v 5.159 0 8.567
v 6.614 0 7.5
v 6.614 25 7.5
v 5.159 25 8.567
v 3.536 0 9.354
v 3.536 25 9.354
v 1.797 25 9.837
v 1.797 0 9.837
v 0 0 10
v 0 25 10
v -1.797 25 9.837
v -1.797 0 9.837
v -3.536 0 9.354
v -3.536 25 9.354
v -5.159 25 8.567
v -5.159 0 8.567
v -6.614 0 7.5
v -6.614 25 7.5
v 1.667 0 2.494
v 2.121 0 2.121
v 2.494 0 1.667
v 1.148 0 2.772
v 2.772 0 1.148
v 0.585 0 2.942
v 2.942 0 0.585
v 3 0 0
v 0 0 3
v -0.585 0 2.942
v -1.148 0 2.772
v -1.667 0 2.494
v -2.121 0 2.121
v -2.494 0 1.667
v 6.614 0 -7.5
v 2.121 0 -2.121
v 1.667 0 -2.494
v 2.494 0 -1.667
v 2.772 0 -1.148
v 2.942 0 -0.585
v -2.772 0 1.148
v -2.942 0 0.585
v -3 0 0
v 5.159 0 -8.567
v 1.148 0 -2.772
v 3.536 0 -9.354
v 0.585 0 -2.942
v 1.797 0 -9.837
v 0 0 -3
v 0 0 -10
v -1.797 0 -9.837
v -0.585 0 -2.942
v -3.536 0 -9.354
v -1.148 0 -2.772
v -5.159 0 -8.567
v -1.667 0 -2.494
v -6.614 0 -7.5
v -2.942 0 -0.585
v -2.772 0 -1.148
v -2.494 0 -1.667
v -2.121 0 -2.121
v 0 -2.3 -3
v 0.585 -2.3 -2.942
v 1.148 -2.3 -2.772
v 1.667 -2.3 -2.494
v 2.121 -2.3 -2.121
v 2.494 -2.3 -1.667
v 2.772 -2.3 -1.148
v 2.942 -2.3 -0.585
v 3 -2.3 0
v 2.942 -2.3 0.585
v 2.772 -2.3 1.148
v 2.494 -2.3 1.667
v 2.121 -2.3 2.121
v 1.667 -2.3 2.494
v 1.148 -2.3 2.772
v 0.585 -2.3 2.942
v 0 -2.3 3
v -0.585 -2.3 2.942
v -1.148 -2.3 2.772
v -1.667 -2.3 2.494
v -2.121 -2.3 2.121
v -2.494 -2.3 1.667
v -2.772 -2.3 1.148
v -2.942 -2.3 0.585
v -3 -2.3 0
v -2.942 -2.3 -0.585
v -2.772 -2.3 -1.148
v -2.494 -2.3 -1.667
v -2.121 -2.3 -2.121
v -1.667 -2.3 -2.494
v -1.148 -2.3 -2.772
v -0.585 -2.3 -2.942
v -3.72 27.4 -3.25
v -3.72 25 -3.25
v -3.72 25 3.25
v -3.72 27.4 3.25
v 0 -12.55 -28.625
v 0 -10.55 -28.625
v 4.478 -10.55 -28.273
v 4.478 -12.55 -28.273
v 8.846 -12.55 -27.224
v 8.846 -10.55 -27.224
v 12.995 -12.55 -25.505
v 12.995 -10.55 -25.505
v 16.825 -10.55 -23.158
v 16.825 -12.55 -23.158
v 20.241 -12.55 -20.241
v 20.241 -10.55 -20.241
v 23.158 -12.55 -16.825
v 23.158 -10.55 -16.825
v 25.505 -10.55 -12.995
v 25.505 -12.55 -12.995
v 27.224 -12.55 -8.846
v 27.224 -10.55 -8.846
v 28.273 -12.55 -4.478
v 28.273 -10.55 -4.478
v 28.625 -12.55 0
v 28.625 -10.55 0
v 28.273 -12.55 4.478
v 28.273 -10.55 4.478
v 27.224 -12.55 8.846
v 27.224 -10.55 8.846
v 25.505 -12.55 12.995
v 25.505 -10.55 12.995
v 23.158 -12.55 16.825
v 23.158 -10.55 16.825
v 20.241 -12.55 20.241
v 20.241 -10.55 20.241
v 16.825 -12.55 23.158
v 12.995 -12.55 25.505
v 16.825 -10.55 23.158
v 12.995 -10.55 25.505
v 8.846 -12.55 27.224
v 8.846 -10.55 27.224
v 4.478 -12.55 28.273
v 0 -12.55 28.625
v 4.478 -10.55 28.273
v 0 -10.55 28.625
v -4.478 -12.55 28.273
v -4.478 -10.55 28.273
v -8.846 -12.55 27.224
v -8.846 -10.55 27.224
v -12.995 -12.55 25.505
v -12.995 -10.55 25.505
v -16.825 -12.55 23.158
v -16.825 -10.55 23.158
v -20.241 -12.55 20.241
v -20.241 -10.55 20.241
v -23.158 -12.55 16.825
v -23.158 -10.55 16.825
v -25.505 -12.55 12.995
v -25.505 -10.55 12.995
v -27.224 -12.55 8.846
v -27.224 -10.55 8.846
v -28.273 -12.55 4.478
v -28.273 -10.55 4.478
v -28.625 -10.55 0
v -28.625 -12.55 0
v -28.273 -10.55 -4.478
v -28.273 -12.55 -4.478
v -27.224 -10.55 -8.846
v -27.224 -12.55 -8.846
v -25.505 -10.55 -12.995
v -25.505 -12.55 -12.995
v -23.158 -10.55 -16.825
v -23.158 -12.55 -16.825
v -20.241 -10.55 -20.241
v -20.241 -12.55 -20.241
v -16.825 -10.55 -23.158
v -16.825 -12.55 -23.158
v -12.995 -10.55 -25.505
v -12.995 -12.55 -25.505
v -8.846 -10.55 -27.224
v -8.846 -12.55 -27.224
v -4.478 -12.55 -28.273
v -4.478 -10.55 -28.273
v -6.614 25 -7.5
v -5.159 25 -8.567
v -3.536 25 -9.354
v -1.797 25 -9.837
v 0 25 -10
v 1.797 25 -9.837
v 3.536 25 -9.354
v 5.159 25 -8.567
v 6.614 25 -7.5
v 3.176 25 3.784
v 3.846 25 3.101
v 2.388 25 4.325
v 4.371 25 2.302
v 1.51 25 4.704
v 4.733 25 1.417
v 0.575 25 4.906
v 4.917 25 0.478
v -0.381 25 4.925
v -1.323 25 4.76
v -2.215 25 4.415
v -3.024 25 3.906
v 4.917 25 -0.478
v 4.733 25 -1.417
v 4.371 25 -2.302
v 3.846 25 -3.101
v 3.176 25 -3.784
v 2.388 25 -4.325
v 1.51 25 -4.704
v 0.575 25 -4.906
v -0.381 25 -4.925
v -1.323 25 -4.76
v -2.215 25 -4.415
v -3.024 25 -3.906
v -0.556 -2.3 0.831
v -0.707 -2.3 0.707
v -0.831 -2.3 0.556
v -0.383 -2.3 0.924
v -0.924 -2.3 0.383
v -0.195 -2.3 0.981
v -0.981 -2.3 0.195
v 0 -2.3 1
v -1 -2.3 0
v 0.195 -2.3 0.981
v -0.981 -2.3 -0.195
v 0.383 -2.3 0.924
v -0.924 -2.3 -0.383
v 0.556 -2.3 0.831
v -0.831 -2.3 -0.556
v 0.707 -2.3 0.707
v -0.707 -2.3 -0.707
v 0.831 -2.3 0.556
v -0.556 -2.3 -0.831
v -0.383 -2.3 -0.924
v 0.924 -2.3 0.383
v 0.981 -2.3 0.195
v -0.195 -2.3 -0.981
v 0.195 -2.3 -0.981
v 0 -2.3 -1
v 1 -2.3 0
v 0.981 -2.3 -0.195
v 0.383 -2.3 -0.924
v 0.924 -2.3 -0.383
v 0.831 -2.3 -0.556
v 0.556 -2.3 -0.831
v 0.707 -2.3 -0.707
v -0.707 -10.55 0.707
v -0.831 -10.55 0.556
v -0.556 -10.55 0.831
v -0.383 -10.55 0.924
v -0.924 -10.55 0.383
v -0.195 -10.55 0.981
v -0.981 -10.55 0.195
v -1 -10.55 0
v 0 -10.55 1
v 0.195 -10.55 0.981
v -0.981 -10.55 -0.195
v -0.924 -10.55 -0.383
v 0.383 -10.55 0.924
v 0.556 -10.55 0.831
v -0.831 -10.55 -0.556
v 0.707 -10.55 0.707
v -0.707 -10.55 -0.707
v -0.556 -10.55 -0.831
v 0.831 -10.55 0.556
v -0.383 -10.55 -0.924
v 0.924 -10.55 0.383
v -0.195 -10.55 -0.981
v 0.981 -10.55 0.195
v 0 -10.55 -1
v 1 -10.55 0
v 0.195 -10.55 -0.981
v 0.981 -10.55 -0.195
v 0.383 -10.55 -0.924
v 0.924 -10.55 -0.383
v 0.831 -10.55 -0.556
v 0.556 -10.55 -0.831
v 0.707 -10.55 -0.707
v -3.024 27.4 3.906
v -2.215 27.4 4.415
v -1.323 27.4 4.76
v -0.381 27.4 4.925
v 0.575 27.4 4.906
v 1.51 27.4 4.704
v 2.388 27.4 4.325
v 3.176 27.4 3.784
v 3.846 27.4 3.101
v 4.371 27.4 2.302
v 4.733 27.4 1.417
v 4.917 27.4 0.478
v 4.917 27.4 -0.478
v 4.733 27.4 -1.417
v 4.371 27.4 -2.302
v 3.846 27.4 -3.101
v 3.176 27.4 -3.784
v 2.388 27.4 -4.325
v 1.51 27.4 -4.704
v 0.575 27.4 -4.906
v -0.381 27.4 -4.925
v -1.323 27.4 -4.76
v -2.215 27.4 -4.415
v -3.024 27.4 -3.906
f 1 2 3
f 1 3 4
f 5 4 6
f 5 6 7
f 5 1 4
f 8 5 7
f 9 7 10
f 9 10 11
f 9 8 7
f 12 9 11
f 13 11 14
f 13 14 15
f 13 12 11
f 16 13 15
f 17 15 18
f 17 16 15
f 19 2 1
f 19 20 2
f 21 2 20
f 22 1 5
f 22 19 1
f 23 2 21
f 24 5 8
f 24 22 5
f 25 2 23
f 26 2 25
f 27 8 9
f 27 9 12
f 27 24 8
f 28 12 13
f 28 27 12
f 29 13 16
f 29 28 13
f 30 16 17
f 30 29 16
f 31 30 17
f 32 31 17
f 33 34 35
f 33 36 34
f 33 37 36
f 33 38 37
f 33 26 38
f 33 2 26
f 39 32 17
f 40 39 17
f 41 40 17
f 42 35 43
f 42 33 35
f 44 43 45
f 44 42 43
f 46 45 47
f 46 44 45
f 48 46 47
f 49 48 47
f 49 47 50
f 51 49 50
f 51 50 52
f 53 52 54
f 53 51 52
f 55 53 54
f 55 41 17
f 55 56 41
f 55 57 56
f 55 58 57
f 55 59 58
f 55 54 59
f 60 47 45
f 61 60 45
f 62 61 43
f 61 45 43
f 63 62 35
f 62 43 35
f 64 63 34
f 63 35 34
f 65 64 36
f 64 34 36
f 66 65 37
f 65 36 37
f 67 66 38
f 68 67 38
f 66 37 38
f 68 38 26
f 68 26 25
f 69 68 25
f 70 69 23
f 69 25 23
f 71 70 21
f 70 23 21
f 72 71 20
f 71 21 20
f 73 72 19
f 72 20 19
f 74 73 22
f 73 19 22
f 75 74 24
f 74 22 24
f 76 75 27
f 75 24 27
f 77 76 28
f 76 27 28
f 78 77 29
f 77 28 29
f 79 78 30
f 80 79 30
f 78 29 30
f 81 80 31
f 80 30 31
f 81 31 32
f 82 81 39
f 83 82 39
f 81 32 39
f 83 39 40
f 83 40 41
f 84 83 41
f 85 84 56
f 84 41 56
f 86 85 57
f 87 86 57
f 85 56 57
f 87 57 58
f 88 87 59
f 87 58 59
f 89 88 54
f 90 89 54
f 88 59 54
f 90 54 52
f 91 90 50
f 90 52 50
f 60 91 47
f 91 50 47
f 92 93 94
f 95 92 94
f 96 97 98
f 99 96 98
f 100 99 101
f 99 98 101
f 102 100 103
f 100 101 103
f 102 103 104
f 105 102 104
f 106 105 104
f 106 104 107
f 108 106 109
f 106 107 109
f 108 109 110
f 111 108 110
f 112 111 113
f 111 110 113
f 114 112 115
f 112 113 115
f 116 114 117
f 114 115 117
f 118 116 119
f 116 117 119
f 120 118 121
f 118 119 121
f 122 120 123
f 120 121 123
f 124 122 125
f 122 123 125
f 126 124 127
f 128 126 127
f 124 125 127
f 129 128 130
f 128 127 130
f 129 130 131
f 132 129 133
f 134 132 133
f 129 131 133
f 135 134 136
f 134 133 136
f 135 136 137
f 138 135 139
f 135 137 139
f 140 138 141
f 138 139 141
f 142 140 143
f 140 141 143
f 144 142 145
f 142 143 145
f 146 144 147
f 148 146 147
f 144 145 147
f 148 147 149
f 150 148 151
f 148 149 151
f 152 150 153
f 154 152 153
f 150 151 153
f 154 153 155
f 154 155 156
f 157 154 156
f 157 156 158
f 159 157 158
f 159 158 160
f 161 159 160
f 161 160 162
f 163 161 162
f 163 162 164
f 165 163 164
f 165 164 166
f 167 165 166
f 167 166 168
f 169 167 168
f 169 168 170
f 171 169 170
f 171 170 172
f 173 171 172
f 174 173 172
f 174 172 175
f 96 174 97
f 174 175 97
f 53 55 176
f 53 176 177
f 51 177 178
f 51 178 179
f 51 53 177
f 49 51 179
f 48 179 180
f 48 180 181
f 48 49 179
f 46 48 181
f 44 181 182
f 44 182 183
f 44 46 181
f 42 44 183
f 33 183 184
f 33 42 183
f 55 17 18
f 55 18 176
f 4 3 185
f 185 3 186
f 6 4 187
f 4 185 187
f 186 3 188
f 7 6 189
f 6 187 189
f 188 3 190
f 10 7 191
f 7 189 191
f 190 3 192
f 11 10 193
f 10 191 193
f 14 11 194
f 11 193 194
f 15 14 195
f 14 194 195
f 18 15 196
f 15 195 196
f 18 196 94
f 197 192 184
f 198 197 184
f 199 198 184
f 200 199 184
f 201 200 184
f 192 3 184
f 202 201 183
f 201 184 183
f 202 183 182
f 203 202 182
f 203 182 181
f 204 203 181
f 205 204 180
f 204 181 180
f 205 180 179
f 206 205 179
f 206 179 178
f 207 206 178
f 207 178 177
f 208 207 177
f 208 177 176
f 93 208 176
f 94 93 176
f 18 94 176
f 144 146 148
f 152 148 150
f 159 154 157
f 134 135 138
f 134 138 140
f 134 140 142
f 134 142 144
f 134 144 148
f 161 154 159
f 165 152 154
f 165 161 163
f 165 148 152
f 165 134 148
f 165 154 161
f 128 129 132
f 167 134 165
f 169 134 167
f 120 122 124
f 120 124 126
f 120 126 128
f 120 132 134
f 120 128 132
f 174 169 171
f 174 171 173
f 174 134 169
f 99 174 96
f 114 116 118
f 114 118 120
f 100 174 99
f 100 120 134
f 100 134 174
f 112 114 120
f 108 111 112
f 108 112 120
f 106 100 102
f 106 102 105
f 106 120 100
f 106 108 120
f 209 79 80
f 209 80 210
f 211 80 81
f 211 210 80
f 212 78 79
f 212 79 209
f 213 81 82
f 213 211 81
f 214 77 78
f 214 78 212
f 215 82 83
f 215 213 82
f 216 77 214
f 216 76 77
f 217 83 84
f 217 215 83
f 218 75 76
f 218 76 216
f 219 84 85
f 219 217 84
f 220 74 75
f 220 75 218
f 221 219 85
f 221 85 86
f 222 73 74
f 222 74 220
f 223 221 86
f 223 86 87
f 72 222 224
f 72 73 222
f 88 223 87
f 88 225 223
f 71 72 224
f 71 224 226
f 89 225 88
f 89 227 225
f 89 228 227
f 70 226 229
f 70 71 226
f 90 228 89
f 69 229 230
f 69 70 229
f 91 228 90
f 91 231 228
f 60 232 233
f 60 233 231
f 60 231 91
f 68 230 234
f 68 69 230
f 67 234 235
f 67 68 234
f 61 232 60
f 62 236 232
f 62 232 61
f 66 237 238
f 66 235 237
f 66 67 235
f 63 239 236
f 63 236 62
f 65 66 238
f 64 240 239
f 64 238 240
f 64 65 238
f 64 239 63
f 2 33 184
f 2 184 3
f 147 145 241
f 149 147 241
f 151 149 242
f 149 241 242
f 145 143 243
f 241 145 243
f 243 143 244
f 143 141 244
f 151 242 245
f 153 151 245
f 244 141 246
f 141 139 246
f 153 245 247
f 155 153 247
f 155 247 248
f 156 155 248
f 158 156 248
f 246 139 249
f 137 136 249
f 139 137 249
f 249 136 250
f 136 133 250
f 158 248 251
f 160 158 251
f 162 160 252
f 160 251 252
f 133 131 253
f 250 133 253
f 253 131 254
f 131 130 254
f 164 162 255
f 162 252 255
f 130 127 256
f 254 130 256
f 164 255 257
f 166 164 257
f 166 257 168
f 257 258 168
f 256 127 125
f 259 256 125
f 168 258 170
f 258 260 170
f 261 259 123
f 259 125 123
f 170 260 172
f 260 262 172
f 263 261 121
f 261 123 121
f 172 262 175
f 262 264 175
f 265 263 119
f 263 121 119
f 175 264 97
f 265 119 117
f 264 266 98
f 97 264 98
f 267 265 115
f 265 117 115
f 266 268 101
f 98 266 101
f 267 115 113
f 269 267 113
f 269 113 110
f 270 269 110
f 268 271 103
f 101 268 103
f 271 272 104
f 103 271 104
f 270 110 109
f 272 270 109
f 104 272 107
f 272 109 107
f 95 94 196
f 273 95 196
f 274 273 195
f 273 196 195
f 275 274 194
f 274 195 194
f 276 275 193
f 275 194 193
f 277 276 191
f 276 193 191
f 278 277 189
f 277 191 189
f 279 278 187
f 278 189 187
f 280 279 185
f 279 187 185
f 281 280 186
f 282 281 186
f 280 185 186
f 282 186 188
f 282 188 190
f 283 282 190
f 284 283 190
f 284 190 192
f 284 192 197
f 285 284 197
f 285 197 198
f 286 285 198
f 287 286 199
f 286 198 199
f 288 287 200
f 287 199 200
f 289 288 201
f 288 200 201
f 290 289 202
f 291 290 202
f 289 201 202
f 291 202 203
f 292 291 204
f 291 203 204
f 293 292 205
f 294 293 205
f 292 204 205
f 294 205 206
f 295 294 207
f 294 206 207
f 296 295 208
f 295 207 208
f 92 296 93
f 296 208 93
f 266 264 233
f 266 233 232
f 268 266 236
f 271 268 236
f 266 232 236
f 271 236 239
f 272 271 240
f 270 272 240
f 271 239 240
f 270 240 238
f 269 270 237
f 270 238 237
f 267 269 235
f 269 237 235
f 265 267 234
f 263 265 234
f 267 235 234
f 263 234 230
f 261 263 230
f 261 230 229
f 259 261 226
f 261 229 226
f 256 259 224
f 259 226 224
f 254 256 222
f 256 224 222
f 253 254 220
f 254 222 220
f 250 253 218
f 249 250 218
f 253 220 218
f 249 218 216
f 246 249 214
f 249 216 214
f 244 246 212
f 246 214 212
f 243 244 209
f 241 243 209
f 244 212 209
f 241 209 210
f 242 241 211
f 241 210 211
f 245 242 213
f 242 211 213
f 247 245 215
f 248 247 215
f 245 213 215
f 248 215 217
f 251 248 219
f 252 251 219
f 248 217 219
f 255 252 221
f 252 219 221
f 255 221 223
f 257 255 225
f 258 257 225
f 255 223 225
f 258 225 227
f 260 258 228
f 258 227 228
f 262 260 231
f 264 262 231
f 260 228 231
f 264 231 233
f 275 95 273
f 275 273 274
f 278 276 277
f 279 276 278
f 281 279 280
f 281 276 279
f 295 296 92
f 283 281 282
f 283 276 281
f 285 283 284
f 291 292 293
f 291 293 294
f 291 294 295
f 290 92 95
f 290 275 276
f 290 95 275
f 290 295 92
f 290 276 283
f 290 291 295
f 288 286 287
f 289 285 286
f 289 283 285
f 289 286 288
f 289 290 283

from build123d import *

# Parameters (mm, degrees)
BOSS_EXTRUDE1_DEPTH = 25
BOSS_EXTRUDE2_DEPTH = 2.4
SKETCH3_R           = 3
SKETCH3_R_2         = 1
BOSS_EXTRUDE3_DEPTH = 2.3
BOSS_EXTRUDE4_START = 2.3
SKETCH3_3_R         = 1
BOSS_EXTRUDE4_DEPTH = 8.25
SKETCH4_R           = 28.625
BOSS_EXTRUDE5_DEPTH = 2


with BuildPart() as part:
    # Sketch1 → Boss-Extrude1 (new body)
    with BuildSketch(Plane(origin=(0, 0, 0), x_dir=(1, 0, 0), z_dir=(0, 1, 0))):
        with BuildLine():
            Line((-6.614378278, -7.5), (-6.614378278, 7.5))
            ThreePointArc((-6.614378278, 7.5), (0, 10), (6.614378278, 7.5))
            Line((6.614378278, 7.5), (6.614378278, -7.5))
            ThreePointArc((6.614378278, -7.5), (0, -10), (-6.614378278, -7.5))
        make_face()
    extrude(amount=BOSS_EXTRUDE1_DEPTH)

    # Sketch2 → Boss-Extrude2 (add)
    with BuildSketch(Plane(origin=(0, 25, 0), x_dir=(1, 0, 0), z_dir=(0, 1, 0))):
        with BuildLine():
            Line((-3.720362886, 3.25), (-3.720362886, -3.25))
            ThreePointArc((-3.720362886, -3.25), (4.94, 0), (-3.720362886, 3.25))
        make_face()
    extrude(amount=BOSS_EXTRUDE2_DEPTH)

    # Sketch3 → Boss-Extrude3 (add)
    # profile 1 of 2: a face of its own
    with BuildSketch(Plane.XZ):
        with Locations(Location((0, 0, 0), (0, 0, 270))):
            Circle(SKETCH3_R)
        Circle(SKETCH3_R_2, mode=Mode.SUBTRACT)
    # profile 2 of 2: a face of its own
    with BuildSketch(Plane.XZ):
        Circle(SKETCH3_R_2)
    extrude(amount=BOSS_EXTRUDE3_DEPTH)

    # Sketch3<3> → Boss-Extrude4 (add)
    with BuildSketch(Plane.XZ.offset(BOSS_EXTRUDE4_START)):
        with Locations(Location((0, 0, 0), (0, 0, 270))):
            Circle(SKETCH3_3_R)
    extrude(amount=BOSS_EXTRUDE4_DEPTH)

    # Sketch4 → Boss-Extrude5 (add)
    with BuildSketch(Plane(origin=(0, -10.55, 0), x_dir=(-1, 0, 0), z_dir=(0, -1, 0))):
        with Locations(Location((0, 0, 0), (0, 0, 90))):
            Circle(SKETCH4_R)
    extrude(amount=BOSS_EXTRUDE5_DEPTH)


solid = part.part
